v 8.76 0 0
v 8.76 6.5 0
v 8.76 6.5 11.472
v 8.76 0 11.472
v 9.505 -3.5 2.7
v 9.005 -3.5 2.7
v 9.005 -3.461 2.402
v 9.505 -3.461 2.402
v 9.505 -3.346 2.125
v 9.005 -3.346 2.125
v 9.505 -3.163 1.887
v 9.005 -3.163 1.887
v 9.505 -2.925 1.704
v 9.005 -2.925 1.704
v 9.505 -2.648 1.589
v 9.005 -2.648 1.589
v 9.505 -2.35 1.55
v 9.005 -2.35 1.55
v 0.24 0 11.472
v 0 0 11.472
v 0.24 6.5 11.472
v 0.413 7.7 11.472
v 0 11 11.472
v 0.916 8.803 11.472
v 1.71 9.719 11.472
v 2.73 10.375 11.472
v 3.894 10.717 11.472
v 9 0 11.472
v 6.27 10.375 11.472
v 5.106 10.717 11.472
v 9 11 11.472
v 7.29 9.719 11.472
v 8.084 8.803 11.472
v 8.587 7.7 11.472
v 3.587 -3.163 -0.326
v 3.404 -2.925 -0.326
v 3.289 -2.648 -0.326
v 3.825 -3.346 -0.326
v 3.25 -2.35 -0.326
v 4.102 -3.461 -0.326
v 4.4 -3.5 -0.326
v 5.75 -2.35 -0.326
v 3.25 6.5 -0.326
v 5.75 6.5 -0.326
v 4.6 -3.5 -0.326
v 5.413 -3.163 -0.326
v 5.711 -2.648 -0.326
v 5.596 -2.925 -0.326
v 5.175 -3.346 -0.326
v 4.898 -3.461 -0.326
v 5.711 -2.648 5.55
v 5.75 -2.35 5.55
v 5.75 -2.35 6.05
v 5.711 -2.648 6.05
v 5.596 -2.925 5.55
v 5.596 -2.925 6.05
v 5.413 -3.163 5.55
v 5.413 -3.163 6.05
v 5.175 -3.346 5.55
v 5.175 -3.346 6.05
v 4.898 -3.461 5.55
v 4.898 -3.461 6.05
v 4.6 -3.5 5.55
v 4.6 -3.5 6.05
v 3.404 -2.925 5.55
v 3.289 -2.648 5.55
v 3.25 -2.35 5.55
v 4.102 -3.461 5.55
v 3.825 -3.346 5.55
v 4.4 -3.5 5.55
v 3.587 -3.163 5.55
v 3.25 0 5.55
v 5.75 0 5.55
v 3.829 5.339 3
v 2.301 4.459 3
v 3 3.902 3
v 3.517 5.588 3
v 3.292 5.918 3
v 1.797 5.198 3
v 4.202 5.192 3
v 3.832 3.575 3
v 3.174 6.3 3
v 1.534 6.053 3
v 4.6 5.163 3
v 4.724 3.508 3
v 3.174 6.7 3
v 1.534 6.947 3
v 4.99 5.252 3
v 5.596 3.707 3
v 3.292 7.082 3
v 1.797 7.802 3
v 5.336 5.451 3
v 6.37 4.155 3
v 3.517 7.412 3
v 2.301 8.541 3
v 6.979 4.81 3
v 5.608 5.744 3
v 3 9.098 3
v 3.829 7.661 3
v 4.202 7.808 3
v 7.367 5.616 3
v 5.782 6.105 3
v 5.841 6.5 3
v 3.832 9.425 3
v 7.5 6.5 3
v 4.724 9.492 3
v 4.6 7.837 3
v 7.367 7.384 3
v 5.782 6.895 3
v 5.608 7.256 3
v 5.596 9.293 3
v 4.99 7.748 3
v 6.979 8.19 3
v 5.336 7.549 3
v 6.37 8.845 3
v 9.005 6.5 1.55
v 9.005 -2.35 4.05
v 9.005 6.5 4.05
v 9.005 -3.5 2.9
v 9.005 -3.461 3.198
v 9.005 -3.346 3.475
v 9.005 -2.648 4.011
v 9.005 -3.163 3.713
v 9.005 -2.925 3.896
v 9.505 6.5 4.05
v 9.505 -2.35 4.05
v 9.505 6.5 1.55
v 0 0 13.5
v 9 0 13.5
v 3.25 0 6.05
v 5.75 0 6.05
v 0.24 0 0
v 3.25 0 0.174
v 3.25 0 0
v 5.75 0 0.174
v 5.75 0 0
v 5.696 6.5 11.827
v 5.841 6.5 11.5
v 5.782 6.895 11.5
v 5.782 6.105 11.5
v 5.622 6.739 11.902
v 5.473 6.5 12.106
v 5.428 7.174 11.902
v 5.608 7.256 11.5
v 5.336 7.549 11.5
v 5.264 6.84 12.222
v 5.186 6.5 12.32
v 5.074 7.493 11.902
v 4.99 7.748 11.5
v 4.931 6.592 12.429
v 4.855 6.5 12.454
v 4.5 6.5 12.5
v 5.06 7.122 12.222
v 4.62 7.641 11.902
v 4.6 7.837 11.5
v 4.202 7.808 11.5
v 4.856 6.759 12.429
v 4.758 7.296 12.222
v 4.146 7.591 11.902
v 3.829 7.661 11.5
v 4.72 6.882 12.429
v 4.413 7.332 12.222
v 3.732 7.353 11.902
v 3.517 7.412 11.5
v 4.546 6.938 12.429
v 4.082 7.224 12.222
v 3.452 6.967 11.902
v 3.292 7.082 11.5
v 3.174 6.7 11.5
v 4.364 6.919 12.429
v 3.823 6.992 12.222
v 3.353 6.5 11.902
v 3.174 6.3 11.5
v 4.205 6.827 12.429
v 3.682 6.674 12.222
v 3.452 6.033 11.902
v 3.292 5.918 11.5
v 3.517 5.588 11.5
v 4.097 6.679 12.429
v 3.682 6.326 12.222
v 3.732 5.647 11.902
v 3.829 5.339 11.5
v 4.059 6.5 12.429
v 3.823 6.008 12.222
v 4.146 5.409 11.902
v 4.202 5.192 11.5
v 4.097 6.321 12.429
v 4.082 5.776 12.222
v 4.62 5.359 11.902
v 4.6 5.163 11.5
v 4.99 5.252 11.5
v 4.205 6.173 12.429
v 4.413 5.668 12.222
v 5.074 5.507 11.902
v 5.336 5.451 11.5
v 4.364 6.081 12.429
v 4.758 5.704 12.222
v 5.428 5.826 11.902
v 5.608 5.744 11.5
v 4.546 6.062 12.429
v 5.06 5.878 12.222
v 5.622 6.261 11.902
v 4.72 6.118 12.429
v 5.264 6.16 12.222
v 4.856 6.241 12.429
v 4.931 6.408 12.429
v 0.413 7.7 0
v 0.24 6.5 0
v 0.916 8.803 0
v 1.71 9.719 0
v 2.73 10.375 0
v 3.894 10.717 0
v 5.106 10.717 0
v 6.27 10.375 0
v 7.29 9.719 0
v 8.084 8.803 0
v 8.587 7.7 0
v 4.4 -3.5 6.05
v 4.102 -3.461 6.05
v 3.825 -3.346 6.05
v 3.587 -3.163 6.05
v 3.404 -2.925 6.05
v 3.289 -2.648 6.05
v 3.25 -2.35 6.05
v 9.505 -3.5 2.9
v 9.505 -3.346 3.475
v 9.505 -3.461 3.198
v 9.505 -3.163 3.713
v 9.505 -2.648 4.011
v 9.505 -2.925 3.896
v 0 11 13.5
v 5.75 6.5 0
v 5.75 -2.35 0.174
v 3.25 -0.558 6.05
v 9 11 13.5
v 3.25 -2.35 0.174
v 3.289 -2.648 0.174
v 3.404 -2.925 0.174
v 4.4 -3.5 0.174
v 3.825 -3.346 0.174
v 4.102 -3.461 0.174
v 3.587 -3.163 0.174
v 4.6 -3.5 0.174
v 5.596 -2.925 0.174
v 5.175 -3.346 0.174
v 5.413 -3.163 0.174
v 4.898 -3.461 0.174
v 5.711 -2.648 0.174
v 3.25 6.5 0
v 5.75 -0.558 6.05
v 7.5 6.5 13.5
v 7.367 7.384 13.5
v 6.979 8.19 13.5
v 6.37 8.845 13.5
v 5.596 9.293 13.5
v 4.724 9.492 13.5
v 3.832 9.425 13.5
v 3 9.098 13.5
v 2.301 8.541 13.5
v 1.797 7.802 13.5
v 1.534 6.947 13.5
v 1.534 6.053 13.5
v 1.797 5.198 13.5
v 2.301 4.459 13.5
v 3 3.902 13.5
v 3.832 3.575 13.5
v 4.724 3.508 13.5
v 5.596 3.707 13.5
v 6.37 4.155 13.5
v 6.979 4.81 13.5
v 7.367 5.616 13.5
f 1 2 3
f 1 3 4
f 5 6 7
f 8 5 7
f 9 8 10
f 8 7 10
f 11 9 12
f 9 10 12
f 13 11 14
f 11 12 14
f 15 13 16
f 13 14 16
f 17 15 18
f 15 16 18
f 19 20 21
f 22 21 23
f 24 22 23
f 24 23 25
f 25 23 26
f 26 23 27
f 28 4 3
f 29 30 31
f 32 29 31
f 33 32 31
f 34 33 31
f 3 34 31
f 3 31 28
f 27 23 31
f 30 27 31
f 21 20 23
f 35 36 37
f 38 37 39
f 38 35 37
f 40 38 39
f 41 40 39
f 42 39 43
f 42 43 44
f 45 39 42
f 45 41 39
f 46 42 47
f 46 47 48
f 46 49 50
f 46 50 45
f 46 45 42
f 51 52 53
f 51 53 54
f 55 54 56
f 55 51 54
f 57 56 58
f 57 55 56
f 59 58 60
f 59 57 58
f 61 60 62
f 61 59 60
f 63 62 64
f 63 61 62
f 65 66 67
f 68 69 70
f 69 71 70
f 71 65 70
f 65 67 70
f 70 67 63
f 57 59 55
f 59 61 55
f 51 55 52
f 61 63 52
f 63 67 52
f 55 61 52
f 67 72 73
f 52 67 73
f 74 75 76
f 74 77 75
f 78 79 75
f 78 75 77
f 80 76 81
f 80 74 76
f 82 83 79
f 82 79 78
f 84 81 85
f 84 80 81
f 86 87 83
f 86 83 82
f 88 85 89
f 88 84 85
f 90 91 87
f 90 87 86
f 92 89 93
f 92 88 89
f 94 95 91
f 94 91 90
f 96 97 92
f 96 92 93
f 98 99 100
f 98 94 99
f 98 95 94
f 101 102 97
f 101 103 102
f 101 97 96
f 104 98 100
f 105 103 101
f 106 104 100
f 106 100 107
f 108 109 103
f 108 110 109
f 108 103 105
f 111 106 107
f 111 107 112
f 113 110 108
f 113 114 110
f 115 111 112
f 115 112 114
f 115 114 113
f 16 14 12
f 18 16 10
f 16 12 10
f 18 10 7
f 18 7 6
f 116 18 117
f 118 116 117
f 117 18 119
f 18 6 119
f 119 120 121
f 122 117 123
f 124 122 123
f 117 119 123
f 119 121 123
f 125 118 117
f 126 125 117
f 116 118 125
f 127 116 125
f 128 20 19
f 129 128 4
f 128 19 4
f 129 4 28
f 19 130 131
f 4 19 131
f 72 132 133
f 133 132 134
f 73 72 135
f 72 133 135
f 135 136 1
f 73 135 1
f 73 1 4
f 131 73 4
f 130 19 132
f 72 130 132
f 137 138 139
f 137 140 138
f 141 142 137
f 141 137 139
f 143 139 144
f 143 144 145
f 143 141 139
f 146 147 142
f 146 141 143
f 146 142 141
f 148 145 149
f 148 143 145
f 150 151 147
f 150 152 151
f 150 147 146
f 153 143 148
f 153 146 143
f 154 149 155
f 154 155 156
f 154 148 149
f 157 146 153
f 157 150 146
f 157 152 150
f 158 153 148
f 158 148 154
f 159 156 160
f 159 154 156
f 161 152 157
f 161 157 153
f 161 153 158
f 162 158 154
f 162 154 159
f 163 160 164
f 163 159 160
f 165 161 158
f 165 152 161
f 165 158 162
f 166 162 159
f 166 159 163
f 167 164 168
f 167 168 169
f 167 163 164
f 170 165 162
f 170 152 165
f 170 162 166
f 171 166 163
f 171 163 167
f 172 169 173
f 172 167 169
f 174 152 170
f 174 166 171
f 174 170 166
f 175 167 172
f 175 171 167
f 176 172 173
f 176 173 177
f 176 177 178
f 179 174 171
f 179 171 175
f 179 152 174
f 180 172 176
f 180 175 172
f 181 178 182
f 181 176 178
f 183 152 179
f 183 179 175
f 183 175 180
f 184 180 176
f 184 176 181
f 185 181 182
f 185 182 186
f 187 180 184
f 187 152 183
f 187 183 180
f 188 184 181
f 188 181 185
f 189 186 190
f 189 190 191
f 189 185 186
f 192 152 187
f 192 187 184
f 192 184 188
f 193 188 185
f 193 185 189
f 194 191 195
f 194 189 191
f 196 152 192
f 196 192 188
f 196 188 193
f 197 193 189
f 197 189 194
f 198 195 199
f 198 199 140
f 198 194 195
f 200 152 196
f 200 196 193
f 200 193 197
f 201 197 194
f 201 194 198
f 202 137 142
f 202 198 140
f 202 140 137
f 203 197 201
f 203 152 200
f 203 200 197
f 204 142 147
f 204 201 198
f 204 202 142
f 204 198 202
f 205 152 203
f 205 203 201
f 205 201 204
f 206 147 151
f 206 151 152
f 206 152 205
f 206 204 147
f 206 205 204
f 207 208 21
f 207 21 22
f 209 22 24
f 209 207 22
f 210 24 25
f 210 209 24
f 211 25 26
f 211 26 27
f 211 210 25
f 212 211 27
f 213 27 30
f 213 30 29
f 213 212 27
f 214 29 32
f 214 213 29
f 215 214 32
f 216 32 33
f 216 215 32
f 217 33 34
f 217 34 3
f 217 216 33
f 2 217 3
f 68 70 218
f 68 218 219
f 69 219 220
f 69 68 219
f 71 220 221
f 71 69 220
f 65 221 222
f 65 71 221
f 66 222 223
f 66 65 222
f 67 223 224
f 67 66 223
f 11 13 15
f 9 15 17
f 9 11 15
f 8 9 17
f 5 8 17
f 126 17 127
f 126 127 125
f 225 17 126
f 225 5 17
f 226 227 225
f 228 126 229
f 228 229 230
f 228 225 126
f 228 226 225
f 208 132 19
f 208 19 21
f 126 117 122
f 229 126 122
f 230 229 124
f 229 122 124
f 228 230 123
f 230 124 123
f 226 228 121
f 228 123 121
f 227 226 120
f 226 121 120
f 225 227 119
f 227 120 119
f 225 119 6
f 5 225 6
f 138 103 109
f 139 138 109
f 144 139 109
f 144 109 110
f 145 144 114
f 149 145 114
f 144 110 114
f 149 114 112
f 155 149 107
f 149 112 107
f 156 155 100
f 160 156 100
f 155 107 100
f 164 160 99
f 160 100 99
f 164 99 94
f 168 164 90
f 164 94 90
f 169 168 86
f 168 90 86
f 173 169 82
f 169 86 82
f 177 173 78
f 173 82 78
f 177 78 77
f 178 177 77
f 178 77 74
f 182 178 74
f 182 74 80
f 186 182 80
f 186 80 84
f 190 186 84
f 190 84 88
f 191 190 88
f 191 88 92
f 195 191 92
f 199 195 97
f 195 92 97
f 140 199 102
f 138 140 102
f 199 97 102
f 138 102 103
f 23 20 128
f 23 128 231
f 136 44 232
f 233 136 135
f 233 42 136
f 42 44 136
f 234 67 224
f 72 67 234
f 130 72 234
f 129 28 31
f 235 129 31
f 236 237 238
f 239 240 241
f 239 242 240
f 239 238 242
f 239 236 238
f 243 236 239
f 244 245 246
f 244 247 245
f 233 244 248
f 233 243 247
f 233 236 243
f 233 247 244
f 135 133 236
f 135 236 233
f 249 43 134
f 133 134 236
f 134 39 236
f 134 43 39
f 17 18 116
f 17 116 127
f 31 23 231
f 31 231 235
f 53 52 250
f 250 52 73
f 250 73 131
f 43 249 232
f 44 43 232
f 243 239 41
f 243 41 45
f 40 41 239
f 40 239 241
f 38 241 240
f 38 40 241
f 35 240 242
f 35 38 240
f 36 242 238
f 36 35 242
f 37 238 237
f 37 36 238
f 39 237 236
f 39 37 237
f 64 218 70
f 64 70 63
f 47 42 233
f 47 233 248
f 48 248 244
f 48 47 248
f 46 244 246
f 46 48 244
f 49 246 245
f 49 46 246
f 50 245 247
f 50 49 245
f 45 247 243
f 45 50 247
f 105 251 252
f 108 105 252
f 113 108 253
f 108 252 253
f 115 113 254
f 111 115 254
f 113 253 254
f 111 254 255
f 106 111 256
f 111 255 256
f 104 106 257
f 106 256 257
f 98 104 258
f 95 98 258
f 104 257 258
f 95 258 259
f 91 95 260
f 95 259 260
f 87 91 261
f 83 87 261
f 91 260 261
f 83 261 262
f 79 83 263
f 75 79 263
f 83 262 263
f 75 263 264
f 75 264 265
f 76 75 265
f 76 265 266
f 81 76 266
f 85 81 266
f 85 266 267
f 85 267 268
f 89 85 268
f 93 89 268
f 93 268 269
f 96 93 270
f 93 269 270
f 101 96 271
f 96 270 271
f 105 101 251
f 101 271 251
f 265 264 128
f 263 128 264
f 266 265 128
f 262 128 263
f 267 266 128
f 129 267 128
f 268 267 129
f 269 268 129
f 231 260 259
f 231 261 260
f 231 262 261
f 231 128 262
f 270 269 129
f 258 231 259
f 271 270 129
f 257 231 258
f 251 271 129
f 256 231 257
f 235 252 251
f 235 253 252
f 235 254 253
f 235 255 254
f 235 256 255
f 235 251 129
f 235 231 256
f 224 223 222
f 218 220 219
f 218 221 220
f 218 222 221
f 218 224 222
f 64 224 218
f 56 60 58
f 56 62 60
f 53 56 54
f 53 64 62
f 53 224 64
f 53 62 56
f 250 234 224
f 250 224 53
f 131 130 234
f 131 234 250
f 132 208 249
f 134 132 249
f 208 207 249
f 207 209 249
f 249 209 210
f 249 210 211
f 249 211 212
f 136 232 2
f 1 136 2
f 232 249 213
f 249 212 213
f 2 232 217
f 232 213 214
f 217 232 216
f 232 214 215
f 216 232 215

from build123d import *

# Parameters (mm, degrees)
SKETCH1_W           = 9
SKETCH1_H           = 11
EXTRUDE1_DEPTH      = 13.5
CUT_EXTRUDE1_DEPTH  = 11.472184734
SKETCH3_W           = 2.5
SKETCH3_H           = 0.5
SKETCH3_W_2         = 0.5
SKETCH3_H_2         = 2.5
EXTRUDE2_DEPTH      = 3.5
EXTRUDE2_DEPTH_BACK = 6.5
CUT_EXTRUDE2_START  = -0.5
CUT_EXTRUDE2_DEPTH  = 0.5
CUT_EXTRUDE3_DEPTH  = 6.37645
SKETCH6_R           = 3
CUT_EXTRUDE4_DEPTH  = 10.5
SKETCH7_R           = 1.341174798
EXTRUDE3_DEPTH      = 8.5
DOME1_FACE_RADIUS   = 1.341174798
DOME1_HEIGHT        = 1


with BuildPart() as part:
    # Sketch1 → Extrude1 (new body)
    with BuildSketch(Plane.XY):
        with Locations((4.5, 5.5)):
            Rectangle(SKETCH1_W, SKETCH1_H)
    extrude(amount=EXTRUDE1_DEPTH)

    # Sketch2 → Cut-Extrude1 (cut)
    with BuildSketch(Plane(origin=(0, 0, 0), x_dir=(-1, 0, 0), z_dir=(0, 0, -1))):
        with BuildLine():
            Line((-8.759861733, 6.5), (-8.759861733, 0))
            Line((-8.759861733, 0), (-10.235511259, 0))
            Line((-10.235511259, 0), (-10.235511259, 11.286267996))
            Line((-10.235511259, 11.286267996), (1.276116648, 11.286267996))
            Line((1.276116648, 11.286267996), (1.276116648, 0))
            Line((1.276116648, 0), (-0.240138267, 0))
            Line((-0.240138267, 0), (-0.240138267, 6.5))
            ThreePointArc((-0.240138267, 6.5), (-4.5, 10.759861733), (-8.759861733, 6.5))
        make_face()
    extrude(amount=-CUT_EXTRUDE1_DEPTH, mode=Mode.SUBTRACT)

    # Sketch3 → Extrude2 (add, two sides)
    with BuildSketch(Plane.XZ) as extrude2_sk:
        with Locations((4.5, 5.8)):
            Rectangle(SKETCH3_W, SKETCH3_H)
        with Locations((9.255436424, 2.8)):
            Rectangle(SKETCH3_W_2, SKETCH3_H_2)
        with Locations((4.5, -0.076449713)):
            Rectangle(SKETCH3_W, SKETCH3_H)
    extrude(amount=EXTRUDE2_DEPTH)
    extrude(extrude2_sk.sketch, amount=-EXTRUDE2_DEPTH_BACK)

    # Sketch4 → Cut-Extrude2 (cut)
    with BuildSketch(Plane(origin=(9.505436424, 0, 0), x_dir=(0, 0, -1), z_dir=(1, 0, 0)).offset(CUT_EXTRUDE2_START)):
        with BuildLine():
            Line((-1.55, 0.401221022), (-0.317888933, 0.401221022))
            Line((-0.317888933, 0.401221022), (-0.317888933, -4.045287891))
            Line((-0.317888933, -4.045287891), (-5.095635432, -4.045287891))
            Line((-5.095635432, -4.045287891), (-5.095635432, 0.401221022))
            Line((-5.095635432, 0.401221022), (-4.05, 0.401221022))
            Line((-4.05, 0.401221022), (-4.05, -2.35))
            ThreePointArc((-4.05, -2.35), (-3.713172798, -3.163172798), (-2.9, -3.5))
            Line((-2.9, -3.5), (-2.7, -3.5))
            ThreePointArc((-2.7, -3.5), (-1.886827202, -3.163172798), (-1.55, -2.35))
            Line((-1.55, -2.35), (-1.55, 0.401221022))
        make_face()
    extrude(amount=CUT_EXTRUDE2_DEPTH, mode=Mode.SUBTRACT)

    # Sketch5 → Cut-Extrude3 (cut)
    with BuildSketch(Plane(origin=(0, 0, -0.326449713), x_dir=(-1, 0, 0), z_dir=(0, 0, -1))):
        with BuildLine():
            Line((-3.25, -0.558332619), (-2.247520265, -0.558332619))
            Line((-2.247520265, -0.558332619), (-2.247520265, -4.051690435))
            Line((-2.247520265, -4.051690435), (-6.966055813, -4.051690435))
            Line((-6.966055813, -4.051690435), (-6.966055813, -0.558332619))
            Line((-6.966055813, -0.558332619), (-5.75, -0.558332619))
            Line((-5.75, -0.558332619), (-5.75, -2.35))
            ThreePointArc((-5.75, -2.35), (-5.413172798, -3.163172798), (-4.6, -3.5))
            Line((-4.6, -3.5), (-4.4, -3.5))
            ThreePointArc((-4.4, -3.5), (-3.586827202, -3.163172798), (-3.25, -2.35))
            Line((-3.25, -2.35), (-3.25, -0.558332619))
        make_face()
    extrude(amount=-CUT_EXTRUDE3_DEPTH, mode=Mode.SUBTRACT)

    # Sketch6 → Cut-Extrude4 (cut)
    with BuildSketch(Plane.XY.offset(13.5)):
        with Locations((4.5, 6.5)):
            Circle(SKETCH6_R)
    extrude(amount=-CUT_EXTRUDE4_DEPTH, mode=Mode.SUBTRACT)

    # Sketch7 → Extrude3 (add)
    with BuildSketch(Plane.XY.offset(3)):
        with Locations((4.5, 6.5)):
            Circle(SKETCH7_R)
    extrude(amount=EXTRUDE3_DEPTH)

    # Dome1: a dome of height H over a round flat face of radius A is a cap of a sphere of radius (A * A + H * H) / (2 * H)
    dome1_r = (DOME1_FACE_RADIUS * DOME1_FACE_RADIUS + DOME1_HEIGHT * DOME1_HEIGHT) / (2 * DOME1_HEIGHT)
    dome1_base = Plane((4.5, 6.5, 11.5), z_dir=(0, 0, 1))
    with Locations(dome1_base.offset(DOME1_HEIGHT - dome1_r)):
        dome1_ball = Sphere(dome1_r, mode=Mode.PRIVATE)
    add(split(dome1_ball, bisect_by=dome1_base, keep=Keep.TOP, mode=Mode.PRIVATE))


solid = part.part
